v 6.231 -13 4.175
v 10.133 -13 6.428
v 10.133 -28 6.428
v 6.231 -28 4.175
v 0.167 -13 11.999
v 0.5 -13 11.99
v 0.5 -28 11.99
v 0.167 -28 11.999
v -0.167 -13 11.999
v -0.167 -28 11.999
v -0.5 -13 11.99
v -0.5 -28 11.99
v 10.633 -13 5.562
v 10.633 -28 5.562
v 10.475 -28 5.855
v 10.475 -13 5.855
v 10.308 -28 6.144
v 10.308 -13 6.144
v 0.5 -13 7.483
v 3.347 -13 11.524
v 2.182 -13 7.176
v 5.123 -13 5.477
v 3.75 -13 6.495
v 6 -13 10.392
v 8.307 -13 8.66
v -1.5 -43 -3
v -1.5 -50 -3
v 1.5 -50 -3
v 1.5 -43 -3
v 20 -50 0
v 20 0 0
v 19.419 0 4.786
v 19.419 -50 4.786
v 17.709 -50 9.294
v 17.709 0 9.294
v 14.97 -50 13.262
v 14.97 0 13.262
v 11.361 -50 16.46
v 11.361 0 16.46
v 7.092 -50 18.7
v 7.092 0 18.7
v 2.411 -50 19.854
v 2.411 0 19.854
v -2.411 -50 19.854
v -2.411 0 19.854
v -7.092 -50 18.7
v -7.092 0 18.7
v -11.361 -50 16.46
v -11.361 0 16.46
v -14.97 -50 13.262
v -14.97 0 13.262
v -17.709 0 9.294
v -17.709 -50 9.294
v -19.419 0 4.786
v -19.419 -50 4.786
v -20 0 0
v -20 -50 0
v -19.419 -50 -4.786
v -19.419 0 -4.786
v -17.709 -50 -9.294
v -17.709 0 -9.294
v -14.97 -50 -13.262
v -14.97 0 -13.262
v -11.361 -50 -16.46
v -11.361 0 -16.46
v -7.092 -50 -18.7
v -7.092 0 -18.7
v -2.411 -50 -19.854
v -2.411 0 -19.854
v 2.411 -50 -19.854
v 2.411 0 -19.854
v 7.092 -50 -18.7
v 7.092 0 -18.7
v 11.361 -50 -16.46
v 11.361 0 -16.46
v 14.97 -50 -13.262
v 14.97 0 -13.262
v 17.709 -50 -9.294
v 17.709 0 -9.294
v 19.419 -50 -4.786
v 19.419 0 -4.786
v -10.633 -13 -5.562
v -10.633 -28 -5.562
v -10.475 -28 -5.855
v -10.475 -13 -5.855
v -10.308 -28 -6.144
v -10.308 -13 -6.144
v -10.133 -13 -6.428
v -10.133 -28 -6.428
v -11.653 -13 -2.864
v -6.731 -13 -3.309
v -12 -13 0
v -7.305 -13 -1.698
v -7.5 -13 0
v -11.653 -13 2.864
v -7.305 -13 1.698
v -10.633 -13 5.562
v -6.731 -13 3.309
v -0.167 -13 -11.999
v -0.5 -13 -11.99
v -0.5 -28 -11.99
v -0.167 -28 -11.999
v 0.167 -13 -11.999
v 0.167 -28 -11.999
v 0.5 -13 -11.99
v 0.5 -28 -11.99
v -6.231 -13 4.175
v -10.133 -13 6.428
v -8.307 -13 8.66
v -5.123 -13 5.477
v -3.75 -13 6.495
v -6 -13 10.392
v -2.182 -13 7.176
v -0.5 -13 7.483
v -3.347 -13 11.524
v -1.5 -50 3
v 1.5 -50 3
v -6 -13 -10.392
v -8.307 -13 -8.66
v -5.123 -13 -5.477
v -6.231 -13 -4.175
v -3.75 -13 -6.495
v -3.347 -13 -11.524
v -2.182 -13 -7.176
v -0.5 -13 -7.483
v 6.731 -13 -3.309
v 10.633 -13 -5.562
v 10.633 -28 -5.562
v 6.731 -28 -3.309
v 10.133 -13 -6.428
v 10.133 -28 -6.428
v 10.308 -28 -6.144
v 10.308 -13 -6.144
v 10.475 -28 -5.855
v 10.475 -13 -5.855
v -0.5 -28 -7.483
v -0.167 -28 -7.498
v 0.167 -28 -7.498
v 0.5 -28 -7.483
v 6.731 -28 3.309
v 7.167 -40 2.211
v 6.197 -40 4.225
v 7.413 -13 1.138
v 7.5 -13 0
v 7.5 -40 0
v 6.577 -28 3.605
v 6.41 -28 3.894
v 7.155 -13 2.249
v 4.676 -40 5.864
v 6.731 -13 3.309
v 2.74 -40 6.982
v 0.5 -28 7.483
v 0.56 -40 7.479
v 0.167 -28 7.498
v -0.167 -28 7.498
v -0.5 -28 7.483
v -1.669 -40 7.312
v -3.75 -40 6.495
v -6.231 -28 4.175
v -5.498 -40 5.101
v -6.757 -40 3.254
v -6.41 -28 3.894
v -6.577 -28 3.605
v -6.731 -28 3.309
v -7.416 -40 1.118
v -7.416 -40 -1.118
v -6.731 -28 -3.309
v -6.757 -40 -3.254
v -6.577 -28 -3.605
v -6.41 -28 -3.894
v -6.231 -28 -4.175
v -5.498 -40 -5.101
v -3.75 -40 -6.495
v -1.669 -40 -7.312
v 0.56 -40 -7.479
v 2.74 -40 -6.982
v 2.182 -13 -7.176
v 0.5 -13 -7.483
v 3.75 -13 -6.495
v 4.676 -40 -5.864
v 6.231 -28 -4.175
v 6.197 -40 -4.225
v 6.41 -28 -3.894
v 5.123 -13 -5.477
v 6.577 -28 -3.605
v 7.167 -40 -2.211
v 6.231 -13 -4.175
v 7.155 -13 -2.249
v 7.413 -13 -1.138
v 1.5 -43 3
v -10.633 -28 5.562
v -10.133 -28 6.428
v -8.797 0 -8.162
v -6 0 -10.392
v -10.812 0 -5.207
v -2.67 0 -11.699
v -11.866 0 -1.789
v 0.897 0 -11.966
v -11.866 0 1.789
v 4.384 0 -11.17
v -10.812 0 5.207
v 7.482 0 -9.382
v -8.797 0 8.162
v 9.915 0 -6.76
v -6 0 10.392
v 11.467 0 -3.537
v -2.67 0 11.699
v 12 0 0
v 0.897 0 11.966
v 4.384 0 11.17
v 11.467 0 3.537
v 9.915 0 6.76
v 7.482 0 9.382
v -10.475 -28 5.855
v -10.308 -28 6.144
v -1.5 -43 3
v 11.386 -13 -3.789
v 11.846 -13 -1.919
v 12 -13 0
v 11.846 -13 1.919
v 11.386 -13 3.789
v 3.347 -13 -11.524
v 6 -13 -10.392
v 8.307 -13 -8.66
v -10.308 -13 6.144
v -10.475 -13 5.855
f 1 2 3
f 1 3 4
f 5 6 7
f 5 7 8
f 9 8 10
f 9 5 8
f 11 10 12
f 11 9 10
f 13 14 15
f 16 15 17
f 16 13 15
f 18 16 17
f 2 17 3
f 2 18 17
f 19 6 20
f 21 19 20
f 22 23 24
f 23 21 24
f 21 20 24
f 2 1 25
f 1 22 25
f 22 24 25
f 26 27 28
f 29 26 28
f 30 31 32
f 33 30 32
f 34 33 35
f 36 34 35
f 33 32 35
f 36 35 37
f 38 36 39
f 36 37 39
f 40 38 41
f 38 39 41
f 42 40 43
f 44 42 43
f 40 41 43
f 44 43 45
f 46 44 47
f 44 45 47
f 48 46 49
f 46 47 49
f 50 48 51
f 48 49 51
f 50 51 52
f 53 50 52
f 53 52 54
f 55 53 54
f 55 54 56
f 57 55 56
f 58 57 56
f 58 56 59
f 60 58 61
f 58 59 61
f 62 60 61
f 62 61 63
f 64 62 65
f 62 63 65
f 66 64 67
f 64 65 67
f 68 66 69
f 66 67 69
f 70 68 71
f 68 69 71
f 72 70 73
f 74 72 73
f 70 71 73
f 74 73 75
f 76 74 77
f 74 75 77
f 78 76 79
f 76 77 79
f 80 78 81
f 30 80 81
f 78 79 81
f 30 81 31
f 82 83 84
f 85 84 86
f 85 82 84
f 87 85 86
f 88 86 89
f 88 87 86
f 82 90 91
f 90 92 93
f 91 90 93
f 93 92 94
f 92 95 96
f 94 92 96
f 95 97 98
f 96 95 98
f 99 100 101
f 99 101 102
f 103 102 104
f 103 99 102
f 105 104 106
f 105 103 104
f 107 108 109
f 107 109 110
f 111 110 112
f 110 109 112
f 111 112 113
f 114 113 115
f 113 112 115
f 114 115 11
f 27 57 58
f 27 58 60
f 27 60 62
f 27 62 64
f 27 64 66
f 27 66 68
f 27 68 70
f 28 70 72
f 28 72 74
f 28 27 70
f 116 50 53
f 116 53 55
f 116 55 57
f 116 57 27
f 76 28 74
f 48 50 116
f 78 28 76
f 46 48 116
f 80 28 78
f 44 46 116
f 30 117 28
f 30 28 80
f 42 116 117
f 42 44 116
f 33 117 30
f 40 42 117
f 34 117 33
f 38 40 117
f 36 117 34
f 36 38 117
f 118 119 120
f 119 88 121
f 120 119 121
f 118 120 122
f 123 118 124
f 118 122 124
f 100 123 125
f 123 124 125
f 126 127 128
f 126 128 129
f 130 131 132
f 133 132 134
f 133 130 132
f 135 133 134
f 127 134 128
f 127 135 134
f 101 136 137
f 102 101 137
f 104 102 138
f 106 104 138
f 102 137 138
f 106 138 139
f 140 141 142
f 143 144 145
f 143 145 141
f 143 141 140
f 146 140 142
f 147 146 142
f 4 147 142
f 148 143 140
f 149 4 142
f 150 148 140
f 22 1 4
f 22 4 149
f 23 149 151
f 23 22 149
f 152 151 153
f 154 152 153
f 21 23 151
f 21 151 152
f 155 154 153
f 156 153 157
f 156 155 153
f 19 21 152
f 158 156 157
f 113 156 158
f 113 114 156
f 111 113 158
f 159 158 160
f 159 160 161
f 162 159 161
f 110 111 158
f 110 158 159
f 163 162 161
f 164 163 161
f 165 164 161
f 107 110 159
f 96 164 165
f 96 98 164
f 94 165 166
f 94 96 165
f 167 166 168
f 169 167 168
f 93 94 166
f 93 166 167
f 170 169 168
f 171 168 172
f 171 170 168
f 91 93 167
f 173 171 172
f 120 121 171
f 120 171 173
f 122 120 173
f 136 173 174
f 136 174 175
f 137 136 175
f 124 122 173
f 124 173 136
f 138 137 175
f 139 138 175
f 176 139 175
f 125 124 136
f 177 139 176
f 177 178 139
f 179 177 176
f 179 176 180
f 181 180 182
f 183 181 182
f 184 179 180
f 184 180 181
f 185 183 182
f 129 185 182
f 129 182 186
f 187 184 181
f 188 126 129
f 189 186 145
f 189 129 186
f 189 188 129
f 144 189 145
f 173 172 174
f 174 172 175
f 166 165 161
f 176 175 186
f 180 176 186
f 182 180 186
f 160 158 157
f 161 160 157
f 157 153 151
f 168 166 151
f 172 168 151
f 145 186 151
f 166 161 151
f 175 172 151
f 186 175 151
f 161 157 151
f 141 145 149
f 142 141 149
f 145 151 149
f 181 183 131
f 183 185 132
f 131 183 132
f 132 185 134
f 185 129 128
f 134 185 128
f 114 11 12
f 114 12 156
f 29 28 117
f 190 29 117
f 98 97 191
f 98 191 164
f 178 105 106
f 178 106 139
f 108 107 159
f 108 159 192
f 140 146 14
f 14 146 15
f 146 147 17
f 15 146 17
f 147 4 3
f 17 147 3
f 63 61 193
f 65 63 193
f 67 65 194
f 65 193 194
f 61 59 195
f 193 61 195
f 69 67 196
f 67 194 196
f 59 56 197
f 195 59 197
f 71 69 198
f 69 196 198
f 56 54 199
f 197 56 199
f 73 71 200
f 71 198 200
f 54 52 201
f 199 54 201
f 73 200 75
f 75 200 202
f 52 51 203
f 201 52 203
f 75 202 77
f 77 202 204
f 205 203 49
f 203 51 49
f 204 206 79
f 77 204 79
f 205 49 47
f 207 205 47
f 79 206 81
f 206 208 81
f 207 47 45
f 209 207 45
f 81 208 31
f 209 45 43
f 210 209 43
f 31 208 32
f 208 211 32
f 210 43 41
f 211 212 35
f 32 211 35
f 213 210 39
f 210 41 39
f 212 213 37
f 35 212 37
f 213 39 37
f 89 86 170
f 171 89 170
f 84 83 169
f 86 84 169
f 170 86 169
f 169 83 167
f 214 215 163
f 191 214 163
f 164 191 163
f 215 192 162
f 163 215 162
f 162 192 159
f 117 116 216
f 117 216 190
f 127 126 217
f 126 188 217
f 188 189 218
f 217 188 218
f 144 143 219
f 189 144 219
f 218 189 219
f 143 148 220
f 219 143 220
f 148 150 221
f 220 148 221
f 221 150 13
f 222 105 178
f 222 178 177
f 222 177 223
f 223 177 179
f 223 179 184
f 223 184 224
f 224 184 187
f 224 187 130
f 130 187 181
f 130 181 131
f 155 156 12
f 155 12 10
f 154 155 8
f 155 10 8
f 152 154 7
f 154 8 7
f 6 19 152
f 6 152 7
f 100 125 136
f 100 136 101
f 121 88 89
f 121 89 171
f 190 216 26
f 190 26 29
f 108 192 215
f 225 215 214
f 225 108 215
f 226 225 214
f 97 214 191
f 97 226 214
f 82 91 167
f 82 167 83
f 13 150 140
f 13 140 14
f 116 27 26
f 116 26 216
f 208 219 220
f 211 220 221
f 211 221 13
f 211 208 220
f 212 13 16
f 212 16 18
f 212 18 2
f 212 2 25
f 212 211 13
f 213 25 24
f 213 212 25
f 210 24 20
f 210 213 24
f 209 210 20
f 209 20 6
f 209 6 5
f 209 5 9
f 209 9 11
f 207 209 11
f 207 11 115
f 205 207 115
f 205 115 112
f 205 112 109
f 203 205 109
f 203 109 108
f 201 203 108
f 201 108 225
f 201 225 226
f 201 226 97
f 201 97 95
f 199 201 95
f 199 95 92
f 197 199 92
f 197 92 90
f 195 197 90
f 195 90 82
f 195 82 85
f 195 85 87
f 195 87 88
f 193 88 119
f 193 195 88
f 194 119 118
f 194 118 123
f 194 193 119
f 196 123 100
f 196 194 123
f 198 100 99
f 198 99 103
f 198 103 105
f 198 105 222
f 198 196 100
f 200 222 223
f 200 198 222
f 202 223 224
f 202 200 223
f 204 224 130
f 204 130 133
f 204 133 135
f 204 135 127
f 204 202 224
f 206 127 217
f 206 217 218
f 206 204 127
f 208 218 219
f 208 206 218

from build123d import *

# Parameters (mm, degrees)
F0_R      = 20
F0_R_2    = 12
F1_DEPTH  = 50
F3_R      = 12
F3_R_2    = 7.5
F4_DEPTH  = 37
F6_DEPTH  = 10
F7_DEPTH  = 15
F9_R      = 7.5
F10_DEPTH = 10
F11_W     = 3
F11_H     = 6
F12_DEPTH = 7


with BuildPart() as f1:
    # F0 (on Front) → F1 (new body)
    with BuildSketch(Plane.XZ):
        Circle(F0_R)
        Circle(F0_R_2, mode=Mode.SUBTRACT)
    extrude(amount=F1_DEPTH)

    # F3 (on offset) → F4 (join)
    with BuildSketch(Plane.XZ.offset(13)):
        Circle(F3_R)
        Circle(F3_R_2, mode=Mode.SUBTRACT)
    extrude(amount=F4_DEPTH)

    # F5 (on offset) → F6 (cut)
    with BuildSketch(Plane.XZ.offset(13)):
        with BuildLine():
            ThreePointArc((0.5, 11.9895788083), (0, 12), (-0.5, 11.9895788083))
            Line((-0.5, 11.9895788083), (-0.5, 7.4833147735))
            ThreePointArc((-0.5, 7.4833147735), (0, 7.5), (0.5, 7.4833147735))
            Line((0.5, 7.4833147735), (0.5, 11.9895788083))
        make_face()
    extrude(amount=F6_DEPTH, mode=Mode.SUBTRACT)

    # F5 (on offset) → F7 (cut)
    with BuildSketch(Plane.XZ.offset(13)):
        with BuildLine():
            ThreePointArc((0.5, 11.9895788083), (0, 12), (-0.5, 11.9895788083))
            Line((-0.5, 11.9895788083), (-0.5, 7.4833147735))
            ThreePointArc((-0.5, 7.4833147735), (0, 7.5), (0.5, 7.4833147735))
            Line((0.5, 7.4833147735), (0.5, 11.9895788083))
        make_face()
        with BuildLine():
            ThreePointArc((-6.7307406984, 3.3086446849), (-6.4951905284, 3.75), (-6.2307406984, 4.1746700887))
            Line((-6.2307406984, 4.1746700887), (-10.1332798286, 6.427802106))
            ThreePointArc((-10.1332798286, 6.427802106), (-10.3923048454, 6), (-10.6332798286, 5.5617767022))
            Line((-10.6332798286, 5.5617767022), (-6.7307406984, 3.3086446849))
        make_face()
        with BuildLine():
            ThreePointArc((-6.2307406984, -4.1746700887), (-6.4951905284, -3.75), (-6.7307406984, -3.3086446849))
            Line((-6.7307406984, -3.3086446849), (-10.6332798286, -5.5617767022))
            ThreePointArc((-10.6332798286, -5.5617767022), (-10.3923048454, -6), (-10.1332798286, -6.427802106))
            Line((-10.1332798286, -6.427802106), (-6.2307406984, -4.1746700887))
        make_face()
        with BuildLine():
            ThreePointArc((0.5, -7.4833147735), (0, -7.5), (-0.5, -7.4833147735))
            Line((-0.5, -7.4833147735), (-0.5, -11.9895788083))
            ThreePointArc((-0.5, -11.9895788083), (0, -12), (0.5, -11.9895788083))
            Line((0.5, -11.9895788083), (0.5, -7.4833147735))
        make_face()
        with BuildLine():
            ThreePointArc((6.7307406984, -3.3086446849), (6.4951905284, -3.75), (6.2307406984, -4.1746700887))
            Line((6.2307406984, -4.1746700887), (10.1332798286, -6.427802106))
            ThreePointArc((10.1332798286, -6.427802106), (10.3923048454, -6), (10.6332798286, -5.5617767022))
            Line((10.6332798286, -5.5617767022), (6.7307406984, -3.3086446849))
        make_face()
        with BuildLine():
            ThreePointArc((6.2307406984, 4.1746700887), (6.4951905284, 3.75), (6.7307406984, 3.3086446849))
            Line((6.7307406984, 3.3086446849), (10.6332798286, 5.5617767022))
            ThreePointArc((10.6332798286, 5.5617767022), (10.3923048454, 6), (10.1332798286, 6.427802106))
            Line((10.1332798286, 6.427802106), (6.2307406984, 4.1746700887))
        make_face()
    extrude(amount=F7_DEPTH, mode=Mode.SUBTRACT)

    # F9 (on offset) → F10 (join)
    with BuildSketch(Plane.XZ.offset(50)):
        Circle(F9_R)
    extrude(amount=-F10_DEPTH)

    # F11 (on offset) → F12 (cut)
    with BuildSketch(Plane.XZ.offset(50)):
        Rectangle(F11_W, F11_H)
    extrude(amount=-F12_DEPTH, mode=Mode.SUBTRACT)


solid = f1.part
